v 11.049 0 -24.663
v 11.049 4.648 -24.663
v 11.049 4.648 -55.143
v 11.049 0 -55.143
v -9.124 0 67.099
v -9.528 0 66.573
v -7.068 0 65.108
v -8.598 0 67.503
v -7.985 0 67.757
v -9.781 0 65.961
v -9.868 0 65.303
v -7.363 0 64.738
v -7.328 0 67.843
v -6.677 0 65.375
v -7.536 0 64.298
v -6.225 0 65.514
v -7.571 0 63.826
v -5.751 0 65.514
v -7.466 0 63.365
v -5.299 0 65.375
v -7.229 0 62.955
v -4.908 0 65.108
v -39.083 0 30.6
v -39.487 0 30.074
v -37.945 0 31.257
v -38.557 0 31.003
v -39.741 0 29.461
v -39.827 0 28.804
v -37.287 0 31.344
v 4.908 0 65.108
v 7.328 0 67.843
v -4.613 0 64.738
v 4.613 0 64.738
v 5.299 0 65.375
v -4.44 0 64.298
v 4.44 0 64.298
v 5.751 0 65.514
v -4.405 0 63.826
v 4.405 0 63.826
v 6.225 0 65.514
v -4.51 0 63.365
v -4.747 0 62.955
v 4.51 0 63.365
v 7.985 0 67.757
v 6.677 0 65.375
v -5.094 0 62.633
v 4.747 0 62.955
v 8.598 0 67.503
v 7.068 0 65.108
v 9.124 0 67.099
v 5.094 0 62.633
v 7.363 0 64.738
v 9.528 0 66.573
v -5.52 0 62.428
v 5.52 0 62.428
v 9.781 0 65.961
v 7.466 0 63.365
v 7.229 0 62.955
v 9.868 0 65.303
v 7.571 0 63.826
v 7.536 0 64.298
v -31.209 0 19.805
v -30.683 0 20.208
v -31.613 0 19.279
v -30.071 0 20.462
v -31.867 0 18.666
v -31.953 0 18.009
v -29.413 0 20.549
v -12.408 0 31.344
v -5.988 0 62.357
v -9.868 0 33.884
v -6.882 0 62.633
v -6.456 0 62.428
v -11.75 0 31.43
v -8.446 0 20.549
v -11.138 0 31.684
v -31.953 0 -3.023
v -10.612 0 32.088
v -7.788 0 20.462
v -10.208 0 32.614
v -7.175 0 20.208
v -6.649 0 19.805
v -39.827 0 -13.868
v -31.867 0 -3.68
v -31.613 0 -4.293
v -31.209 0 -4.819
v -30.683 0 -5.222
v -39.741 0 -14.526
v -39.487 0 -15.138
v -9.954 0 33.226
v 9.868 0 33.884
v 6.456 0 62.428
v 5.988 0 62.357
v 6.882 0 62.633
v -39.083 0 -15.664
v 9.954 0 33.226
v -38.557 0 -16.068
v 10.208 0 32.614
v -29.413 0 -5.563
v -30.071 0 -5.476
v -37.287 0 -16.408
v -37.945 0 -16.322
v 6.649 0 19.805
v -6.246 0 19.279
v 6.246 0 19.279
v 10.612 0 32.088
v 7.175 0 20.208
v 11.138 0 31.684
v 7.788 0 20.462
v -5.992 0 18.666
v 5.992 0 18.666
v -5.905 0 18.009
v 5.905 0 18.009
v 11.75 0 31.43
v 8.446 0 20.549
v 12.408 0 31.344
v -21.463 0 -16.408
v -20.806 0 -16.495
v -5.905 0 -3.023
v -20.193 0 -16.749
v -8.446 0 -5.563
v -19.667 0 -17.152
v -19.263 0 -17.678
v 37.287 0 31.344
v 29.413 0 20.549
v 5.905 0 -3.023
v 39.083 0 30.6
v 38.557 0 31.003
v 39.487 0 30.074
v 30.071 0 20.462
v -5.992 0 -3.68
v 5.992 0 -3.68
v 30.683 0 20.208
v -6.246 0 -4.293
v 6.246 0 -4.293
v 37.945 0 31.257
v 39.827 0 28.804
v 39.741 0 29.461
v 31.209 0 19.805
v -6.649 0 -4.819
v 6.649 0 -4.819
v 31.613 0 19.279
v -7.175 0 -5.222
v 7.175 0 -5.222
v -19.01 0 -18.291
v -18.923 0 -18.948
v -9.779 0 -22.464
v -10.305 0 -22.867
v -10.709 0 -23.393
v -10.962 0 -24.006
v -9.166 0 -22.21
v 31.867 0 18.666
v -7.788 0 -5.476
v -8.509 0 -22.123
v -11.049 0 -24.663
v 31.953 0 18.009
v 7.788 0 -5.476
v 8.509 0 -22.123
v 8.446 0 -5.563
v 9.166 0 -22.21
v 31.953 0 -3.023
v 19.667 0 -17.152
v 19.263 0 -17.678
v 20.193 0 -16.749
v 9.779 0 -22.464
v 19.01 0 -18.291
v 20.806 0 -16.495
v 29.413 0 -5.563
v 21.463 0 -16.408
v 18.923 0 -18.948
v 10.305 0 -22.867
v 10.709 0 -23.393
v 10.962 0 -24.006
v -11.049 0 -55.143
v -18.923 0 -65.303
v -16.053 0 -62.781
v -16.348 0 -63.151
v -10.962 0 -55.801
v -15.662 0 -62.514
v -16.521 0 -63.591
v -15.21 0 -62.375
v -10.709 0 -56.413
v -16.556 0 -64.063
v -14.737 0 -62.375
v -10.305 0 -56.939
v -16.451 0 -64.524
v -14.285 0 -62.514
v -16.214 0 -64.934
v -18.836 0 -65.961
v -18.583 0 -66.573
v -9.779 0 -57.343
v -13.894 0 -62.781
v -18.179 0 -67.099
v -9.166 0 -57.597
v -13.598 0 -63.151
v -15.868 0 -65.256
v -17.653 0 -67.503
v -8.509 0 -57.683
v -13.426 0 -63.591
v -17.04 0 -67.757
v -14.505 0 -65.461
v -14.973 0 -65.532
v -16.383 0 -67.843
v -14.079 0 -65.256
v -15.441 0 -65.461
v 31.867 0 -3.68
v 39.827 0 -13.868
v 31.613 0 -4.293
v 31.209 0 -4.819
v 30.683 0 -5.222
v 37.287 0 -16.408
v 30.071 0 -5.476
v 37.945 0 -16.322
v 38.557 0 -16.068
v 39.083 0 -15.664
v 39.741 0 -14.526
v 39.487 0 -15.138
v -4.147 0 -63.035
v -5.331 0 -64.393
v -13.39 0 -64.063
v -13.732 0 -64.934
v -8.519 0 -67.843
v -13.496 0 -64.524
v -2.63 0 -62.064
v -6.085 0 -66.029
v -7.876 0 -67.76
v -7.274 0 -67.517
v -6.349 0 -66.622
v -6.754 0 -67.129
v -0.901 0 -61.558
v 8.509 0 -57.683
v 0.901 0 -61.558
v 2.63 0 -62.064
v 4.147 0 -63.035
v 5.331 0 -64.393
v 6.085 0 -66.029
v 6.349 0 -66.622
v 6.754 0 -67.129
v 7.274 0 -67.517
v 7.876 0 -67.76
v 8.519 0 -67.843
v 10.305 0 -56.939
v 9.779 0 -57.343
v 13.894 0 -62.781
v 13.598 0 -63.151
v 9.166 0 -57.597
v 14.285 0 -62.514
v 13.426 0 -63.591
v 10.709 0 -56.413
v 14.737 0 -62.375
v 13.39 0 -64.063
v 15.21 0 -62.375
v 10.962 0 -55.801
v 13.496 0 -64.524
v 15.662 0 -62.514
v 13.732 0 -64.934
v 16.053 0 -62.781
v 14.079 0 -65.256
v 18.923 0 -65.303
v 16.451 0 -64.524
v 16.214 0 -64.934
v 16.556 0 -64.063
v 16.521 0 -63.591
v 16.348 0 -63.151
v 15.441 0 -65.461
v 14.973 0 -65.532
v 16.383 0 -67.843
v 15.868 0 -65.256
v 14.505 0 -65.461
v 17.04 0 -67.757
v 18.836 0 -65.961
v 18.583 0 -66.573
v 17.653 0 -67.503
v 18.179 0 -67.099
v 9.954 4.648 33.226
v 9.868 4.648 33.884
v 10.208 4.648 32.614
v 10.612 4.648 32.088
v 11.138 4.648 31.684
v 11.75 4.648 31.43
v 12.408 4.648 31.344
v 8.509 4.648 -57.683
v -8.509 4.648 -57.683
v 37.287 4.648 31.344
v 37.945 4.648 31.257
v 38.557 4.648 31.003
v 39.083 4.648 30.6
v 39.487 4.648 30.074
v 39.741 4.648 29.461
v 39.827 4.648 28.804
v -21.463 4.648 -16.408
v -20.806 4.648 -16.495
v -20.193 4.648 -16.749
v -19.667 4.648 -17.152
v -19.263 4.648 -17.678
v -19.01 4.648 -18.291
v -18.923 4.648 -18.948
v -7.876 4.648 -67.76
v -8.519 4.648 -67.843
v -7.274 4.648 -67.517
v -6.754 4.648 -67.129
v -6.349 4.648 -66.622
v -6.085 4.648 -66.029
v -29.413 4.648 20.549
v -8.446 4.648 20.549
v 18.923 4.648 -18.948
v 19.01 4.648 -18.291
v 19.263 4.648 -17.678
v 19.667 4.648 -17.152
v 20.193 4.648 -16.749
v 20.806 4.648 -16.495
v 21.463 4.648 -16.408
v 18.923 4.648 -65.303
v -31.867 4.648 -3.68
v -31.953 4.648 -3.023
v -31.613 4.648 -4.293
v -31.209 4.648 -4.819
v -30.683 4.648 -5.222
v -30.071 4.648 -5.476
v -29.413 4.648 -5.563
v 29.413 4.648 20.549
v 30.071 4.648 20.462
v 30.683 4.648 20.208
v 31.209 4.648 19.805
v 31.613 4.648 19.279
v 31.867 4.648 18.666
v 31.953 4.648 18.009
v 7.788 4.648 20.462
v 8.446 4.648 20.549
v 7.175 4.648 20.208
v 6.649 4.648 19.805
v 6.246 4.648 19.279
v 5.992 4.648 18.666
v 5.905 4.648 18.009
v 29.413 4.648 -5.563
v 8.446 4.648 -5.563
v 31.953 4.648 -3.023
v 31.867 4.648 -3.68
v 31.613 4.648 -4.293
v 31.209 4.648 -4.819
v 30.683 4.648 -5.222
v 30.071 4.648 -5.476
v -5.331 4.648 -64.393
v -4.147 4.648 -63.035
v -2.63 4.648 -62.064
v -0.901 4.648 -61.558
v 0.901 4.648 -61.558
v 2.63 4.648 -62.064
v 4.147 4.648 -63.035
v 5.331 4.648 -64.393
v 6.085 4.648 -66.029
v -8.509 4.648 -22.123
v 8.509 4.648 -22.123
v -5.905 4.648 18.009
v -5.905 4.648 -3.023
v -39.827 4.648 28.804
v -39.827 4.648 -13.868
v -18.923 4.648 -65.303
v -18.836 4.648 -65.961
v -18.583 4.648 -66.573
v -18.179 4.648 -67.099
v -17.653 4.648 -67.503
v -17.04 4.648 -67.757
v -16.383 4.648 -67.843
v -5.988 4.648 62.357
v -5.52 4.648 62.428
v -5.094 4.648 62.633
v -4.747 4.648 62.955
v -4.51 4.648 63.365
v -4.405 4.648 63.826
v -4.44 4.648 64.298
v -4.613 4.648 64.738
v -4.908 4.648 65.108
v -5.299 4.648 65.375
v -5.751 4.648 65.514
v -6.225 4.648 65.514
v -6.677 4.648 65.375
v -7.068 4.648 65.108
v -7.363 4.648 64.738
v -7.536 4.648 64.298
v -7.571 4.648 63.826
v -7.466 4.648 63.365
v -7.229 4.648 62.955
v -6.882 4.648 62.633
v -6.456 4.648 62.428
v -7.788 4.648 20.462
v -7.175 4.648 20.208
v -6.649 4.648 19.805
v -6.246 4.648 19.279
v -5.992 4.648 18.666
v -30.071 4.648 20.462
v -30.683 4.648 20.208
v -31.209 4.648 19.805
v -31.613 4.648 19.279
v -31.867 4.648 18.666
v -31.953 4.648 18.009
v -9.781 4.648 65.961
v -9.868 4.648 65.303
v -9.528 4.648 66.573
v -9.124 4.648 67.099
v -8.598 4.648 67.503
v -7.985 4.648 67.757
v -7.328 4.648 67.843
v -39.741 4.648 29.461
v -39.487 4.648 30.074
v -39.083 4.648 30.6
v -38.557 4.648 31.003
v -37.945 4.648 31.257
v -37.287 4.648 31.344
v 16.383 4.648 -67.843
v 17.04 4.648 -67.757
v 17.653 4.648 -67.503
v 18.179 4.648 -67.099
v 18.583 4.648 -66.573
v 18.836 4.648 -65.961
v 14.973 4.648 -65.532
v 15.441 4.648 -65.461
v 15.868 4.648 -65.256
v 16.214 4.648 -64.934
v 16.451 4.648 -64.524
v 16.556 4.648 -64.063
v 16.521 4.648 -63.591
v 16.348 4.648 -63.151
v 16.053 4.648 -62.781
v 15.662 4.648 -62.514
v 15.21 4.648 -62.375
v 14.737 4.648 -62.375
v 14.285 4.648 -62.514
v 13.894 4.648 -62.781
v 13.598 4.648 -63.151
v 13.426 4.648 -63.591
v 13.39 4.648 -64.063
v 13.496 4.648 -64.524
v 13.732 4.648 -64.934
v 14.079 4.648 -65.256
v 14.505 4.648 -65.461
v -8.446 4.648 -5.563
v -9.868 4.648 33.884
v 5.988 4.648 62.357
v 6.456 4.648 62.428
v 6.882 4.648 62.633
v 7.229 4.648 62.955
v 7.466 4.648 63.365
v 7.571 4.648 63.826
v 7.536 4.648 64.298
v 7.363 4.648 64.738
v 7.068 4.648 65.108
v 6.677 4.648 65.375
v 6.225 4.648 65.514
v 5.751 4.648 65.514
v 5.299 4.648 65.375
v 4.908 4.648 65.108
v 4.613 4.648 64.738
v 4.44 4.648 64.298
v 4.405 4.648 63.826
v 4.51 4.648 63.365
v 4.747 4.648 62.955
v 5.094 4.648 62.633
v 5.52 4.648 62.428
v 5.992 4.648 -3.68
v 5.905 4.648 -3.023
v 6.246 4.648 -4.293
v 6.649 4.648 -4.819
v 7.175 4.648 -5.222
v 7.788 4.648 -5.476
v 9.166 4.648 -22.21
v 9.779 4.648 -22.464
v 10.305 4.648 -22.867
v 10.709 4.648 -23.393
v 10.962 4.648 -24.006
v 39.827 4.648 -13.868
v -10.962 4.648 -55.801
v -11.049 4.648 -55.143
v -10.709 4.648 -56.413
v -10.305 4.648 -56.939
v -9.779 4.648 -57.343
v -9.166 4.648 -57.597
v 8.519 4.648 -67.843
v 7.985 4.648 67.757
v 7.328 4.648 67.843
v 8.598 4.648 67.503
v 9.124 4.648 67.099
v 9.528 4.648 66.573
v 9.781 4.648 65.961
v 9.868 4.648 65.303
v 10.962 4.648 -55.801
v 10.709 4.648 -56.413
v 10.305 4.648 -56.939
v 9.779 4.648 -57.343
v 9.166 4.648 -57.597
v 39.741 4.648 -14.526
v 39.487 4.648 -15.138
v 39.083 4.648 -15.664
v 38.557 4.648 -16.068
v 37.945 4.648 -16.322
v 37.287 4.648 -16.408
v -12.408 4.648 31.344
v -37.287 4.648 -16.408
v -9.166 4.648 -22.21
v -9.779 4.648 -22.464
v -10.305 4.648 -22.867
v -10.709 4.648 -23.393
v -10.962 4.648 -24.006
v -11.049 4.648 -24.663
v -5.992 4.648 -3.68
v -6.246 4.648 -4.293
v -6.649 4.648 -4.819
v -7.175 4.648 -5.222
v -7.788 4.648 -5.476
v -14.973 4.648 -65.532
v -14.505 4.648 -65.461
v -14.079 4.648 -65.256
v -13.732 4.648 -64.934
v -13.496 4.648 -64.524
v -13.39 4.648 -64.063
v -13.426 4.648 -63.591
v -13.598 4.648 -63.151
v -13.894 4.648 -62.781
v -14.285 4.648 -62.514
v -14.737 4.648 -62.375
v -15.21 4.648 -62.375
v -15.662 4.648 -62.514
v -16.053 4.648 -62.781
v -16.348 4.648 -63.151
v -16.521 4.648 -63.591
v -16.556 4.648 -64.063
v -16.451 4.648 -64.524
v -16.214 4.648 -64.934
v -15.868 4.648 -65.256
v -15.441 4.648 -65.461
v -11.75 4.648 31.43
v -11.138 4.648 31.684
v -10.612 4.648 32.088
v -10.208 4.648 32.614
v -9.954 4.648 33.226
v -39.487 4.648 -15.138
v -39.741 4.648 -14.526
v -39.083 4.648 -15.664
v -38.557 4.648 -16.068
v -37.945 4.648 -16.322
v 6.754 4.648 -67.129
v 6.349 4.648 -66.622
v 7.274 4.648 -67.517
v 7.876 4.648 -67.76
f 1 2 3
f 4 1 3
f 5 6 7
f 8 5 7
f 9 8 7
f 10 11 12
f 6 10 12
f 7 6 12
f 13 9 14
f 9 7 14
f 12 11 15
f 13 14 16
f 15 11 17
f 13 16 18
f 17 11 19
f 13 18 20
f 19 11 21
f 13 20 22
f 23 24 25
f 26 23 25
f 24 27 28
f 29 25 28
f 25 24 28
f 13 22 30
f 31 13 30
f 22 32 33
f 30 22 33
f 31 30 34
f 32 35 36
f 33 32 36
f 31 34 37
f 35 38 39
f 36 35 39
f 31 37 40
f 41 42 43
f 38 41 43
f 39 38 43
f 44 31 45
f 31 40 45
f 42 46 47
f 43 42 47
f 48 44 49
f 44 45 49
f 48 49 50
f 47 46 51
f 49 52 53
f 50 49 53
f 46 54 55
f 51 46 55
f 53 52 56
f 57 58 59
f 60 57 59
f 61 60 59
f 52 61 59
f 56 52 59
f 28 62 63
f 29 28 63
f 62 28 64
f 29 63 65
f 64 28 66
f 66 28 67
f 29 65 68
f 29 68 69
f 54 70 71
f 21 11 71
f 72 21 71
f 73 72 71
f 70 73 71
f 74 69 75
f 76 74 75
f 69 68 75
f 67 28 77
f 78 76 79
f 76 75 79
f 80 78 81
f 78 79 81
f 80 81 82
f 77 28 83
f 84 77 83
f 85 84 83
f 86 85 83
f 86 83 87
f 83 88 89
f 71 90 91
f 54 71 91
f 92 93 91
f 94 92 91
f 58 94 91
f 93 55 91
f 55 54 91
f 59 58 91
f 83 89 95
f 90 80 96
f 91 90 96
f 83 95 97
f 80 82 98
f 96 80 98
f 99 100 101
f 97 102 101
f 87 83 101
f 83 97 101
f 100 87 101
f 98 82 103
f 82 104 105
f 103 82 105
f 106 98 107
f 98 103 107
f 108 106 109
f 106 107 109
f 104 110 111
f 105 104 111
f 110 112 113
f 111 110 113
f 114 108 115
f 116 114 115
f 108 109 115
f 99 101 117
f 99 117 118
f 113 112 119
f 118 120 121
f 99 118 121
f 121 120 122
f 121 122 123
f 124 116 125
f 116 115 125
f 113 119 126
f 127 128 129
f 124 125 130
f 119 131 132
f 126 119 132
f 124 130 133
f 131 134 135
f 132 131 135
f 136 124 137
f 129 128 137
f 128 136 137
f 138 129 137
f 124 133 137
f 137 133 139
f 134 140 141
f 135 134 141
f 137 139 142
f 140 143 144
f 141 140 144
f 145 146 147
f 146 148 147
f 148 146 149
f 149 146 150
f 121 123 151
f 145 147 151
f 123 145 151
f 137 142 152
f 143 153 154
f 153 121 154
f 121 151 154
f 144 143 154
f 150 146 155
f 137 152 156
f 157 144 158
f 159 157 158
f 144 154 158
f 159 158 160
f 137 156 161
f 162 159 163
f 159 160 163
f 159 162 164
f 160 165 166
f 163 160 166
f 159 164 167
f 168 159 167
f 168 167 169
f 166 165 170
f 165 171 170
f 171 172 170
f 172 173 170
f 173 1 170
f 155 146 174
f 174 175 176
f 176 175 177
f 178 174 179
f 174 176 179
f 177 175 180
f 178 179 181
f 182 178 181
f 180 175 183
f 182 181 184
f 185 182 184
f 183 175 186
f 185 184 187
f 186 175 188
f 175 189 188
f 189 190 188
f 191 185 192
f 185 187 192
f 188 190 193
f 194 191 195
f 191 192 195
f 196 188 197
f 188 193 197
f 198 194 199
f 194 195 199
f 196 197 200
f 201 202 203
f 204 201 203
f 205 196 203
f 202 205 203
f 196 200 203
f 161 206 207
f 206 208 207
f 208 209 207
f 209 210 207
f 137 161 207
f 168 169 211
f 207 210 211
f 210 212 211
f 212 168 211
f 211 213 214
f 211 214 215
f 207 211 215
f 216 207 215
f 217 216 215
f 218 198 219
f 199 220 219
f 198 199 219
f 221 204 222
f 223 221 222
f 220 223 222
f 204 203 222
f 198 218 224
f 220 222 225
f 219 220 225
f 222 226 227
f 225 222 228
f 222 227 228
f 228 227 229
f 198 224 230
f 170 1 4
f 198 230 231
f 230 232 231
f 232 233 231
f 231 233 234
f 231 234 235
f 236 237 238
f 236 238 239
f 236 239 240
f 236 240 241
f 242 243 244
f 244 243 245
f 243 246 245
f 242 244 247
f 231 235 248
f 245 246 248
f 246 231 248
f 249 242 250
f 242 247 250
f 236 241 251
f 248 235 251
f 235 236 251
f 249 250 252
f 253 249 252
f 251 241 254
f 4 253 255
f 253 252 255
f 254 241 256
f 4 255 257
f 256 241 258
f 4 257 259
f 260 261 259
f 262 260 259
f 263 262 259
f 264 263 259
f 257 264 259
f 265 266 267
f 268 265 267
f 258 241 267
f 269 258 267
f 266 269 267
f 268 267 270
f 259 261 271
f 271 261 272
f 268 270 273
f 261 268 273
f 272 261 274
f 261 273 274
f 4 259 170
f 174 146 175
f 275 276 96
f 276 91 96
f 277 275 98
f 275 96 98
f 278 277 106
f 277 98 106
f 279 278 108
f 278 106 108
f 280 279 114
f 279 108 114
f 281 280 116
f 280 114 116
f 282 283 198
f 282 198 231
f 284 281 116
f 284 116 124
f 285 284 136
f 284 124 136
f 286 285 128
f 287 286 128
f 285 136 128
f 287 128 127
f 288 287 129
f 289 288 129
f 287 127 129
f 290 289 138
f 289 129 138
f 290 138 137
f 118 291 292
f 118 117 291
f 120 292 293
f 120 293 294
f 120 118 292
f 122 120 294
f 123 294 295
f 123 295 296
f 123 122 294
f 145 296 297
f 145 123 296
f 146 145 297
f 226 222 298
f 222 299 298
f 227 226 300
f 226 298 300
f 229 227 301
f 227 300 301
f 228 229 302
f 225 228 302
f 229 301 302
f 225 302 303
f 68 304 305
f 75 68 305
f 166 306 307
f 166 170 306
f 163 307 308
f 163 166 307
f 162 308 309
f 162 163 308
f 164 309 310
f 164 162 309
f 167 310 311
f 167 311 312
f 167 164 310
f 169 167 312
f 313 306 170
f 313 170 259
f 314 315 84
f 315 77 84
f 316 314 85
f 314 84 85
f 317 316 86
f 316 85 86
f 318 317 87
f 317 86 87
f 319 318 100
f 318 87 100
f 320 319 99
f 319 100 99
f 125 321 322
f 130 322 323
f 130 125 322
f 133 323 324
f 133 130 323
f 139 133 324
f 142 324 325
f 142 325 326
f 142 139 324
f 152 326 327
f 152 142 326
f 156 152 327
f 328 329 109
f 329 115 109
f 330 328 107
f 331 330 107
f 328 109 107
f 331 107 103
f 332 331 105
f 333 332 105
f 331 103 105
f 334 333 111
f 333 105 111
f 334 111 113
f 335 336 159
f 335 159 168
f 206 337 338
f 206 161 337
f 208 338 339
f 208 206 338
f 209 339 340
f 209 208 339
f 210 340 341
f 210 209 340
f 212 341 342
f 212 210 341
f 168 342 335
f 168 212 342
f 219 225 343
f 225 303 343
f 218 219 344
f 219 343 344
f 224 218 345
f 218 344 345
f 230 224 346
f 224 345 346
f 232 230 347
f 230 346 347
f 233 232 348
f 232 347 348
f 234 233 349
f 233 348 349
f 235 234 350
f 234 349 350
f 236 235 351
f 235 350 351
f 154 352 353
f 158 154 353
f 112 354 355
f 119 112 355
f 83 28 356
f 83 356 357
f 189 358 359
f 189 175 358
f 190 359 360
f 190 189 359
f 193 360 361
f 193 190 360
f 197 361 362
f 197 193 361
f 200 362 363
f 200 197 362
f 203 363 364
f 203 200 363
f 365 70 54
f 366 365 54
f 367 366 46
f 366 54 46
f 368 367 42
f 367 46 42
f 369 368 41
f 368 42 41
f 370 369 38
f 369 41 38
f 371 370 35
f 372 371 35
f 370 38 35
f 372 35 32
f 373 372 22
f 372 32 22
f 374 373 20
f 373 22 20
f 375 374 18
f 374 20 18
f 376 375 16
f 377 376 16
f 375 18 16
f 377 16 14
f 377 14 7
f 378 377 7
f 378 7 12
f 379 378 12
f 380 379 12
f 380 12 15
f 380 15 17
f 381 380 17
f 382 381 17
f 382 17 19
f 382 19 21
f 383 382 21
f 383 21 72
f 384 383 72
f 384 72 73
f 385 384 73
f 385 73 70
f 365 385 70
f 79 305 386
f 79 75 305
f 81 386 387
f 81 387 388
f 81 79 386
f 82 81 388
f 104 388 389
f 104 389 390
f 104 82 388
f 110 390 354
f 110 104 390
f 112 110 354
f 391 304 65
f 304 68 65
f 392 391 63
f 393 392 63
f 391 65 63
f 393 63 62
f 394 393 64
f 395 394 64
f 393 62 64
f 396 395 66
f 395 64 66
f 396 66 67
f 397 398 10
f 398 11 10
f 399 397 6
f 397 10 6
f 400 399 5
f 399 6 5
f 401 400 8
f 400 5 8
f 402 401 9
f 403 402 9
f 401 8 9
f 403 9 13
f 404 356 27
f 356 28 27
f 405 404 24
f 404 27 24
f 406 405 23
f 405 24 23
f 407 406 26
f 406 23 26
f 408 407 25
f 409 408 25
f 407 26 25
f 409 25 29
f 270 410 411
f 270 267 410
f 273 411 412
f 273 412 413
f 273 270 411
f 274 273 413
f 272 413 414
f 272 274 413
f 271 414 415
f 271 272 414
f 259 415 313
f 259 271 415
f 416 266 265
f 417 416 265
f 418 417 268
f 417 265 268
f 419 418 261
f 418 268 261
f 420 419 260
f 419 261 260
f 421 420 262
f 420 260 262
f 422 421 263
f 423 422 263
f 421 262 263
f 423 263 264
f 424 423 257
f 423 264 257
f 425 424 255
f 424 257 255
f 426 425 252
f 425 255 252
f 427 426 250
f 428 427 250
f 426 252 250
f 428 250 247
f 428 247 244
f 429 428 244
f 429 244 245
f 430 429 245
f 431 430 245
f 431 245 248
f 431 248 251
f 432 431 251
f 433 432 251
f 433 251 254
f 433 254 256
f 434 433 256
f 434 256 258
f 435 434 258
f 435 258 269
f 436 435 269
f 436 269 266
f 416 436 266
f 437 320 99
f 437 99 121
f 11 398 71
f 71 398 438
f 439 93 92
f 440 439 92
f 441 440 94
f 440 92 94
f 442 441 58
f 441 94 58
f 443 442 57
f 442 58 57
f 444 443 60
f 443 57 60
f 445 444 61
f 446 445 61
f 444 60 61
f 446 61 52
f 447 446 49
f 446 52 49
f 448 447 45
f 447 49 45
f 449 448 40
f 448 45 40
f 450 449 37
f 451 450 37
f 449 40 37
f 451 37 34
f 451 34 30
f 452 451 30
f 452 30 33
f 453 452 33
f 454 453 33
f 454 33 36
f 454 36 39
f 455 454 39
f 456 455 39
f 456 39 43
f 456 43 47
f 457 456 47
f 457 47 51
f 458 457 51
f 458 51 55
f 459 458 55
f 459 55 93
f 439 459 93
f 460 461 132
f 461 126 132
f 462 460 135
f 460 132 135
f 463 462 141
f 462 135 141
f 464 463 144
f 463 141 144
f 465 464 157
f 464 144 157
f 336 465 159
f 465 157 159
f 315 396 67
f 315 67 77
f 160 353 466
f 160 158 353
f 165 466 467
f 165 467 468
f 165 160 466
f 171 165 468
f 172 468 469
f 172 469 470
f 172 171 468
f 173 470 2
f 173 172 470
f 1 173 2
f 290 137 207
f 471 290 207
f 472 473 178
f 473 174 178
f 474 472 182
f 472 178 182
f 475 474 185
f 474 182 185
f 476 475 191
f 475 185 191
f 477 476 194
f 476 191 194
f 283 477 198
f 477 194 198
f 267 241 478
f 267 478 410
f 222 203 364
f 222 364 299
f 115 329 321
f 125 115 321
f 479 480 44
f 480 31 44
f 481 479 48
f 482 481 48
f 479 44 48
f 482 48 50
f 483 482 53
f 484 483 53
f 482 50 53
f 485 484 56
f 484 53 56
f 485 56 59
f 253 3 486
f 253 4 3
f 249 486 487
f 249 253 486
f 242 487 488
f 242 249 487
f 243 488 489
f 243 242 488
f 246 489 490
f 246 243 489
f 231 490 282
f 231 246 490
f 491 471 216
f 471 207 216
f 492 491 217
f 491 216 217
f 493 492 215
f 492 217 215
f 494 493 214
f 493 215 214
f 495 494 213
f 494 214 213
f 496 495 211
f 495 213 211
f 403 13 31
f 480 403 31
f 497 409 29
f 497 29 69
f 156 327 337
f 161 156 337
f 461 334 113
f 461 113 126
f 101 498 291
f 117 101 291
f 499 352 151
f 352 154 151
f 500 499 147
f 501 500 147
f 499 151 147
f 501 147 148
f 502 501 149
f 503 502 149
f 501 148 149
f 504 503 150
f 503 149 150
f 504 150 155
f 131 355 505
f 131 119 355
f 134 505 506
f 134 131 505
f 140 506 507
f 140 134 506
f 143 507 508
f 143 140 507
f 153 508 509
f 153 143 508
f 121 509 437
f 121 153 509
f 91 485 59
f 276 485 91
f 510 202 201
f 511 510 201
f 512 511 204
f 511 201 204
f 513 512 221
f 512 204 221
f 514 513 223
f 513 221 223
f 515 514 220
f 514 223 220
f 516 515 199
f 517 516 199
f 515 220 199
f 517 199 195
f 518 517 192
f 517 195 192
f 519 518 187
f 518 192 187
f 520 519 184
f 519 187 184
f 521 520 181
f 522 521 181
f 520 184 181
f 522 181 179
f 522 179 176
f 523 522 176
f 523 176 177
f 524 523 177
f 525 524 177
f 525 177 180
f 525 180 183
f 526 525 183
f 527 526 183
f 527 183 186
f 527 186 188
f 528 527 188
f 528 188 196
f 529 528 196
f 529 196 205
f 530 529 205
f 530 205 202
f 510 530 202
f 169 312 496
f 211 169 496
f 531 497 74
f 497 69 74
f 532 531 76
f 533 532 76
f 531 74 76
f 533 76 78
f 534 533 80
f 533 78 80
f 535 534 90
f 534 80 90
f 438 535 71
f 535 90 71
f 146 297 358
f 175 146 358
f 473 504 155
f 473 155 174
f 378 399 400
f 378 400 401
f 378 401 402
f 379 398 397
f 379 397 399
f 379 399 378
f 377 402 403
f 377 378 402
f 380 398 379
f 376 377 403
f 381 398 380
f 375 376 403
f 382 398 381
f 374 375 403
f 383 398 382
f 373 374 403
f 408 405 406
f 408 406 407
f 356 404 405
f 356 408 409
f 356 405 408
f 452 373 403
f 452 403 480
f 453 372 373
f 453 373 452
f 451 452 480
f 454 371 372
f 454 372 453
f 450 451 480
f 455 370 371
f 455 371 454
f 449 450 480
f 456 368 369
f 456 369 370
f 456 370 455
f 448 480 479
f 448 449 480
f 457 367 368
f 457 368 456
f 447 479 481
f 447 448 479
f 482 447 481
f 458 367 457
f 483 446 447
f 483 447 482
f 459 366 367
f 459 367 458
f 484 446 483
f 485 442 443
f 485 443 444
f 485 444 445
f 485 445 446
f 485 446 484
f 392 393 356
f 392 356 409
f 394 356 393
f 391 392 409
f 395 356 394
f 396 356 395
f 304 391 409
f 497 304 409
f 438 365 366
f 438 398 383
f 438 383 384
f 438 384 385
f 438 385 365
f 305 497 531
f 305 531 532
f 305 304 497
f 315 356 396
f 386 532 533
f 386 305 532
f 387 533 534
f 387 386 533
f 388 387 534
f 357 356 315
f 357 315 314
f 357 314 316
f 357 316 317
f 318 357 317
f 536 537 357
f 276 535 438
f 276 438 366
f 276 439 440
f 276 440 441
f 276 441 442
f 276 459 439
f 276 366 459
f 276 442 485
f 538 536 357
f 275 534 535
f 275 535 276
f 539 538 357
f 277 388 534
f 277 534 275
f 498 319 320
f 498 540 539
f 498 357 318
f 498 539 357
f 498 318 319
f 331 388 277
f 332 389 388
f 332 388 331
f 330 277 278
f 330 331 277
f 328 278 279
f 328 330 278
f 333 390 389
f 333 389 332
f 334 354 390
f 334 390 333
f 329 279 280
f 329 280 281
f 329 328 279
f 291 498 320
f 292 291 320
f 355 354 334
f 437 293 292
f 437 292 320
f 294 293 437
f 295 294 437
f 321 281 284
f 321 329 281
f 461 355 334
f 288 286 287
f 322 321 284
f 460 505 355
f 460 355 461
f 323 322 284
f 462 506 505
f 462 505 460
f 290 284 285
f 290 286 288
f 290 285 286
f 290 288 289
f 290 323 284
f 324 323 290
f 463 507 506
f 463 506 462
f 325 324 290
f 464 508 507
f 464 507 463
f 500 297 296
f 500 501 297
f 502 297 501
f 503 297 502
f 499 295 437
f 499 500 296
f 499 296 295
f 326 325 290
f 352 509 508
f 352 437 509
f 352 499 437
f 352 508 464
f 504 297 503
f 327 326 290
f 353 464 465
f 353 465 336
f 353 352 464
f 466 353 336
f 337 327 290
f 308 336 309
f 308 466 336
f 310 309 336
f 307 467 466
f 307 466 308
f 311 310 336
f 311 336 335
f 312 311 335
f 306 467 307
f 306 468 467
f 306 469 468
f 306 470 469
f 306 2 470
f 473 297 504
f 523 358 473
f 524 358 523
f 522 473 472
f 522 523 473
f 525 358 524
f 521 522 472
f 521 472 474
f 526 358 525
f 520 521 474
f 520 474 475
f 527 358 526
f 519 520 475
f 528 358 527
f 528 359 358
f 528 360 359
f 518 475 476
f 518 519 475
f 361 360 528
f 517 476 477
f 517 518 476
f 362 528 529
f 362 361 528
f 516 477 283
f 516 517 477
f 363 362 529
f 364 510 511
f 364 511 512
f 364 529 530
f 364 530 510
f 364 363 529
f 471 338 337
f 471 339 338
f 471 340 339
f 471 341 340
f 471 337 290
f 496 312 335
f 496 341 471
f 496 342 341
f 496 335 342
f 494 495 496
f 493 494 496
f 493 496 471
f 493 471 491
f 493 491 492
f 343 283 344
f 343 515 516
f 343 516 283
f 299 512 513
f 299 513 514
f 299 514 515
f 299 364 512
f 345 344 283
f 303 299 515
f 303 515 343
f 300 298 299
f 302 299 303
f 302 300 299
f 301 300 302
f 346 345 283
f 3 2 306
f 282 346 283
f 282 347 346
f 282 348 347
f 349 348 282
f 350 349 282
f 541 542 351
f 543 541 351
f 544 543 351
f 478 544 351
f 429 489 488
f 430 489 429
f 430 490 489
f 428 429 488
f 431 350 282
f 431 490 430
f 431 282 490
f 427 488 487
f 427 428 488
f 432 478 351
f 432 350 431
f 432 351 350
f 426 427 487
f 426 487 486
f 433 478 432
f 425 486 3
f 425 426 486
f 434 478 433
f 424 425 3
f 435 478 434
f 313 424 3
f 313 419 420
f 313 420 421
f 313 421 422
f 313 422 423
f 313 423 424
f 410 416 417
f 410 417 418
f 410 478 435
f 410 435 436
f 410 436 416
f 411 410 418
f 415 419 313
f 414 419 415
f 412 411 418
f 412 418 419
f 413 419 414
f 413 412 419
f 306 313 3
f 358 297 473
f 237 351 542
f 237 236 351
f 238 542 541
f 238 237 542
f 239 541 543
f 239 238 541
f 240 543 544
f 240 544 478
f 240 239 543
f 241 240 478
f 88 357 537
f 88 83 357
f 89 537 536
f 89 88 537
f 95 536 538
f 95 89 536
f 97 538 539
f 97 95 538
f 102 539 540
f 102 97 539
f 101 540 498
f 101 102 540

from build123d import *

# Parameters (mm, degrees)
SKETCH1_W                    = 79.6544
SKETCH1_H                    = 135.6868
BOSS_EXTRUDE1_DEPTH          = 4.6482
SKETCH2_W                    = 20.9042
SKETCH2_H                    = 51.435
SKETCH2_W_2                  = 22.098
SKETCH2_H_2                  = 35.56
SKETCH2_W_3                  = 26.0477
SKETCH2_H_3                  = 26.1112
SKETCH2_W_4                  = 29.9593
SKETCH2_H_4                  = 36.4998
CUT_EXTRUDE1_DEPTH           = 79.806970165
F_1_8_0_125_DIAMETER_HOLE1_D = 3.175
FILLET1_R                    = 2.54


with BuildPart() as part:
    # Sketch1 → Boss-Extrude1 (new body)
    with BuildSketch(Plane(origin=(0, 0, 0), x_dir=(1, 0, 0), z_dir=(0, 1, 0))):
        Rectangle(SKETCH1_W, SKETCH1_H)
    extrude(amount=BOSS_EXTRUDE1_DEPTH)

    # Sketch2 → Cut-Extrude1 (cut, through all)
    with BuildSketch(Plane(origin=(0, 4.6482, 0), x_dir=(1, 0, 0), z_dir=(0, 1, 0))):
        with Locations((29.3751, 42.1259)):
            Rectangle(SKETCH2_W, SKETCH2_H)
        with Locations((0, 39.9034)):
            Rectangle(SKETCH2_W_2, SKETCH2_H_2)
        with Locations((18.92935, -7.493)):
            Rectangle(SKETCH2_W_3, SKETCH2_H_3)
        with Locations((-18.92935, -7.493)):
            Rectangle(SKETCH2_W_3, SKETCH2_H_3)
        with Locations((-24.84755, -49.5935)):
            Rectangle(SKETCH2_W_4, SKETCH2_H_4)
        with Locations((24.84755, -49.5935)):
            Rectangle(SKETCH2_W_4, SKETCH2_H_4)
        with BuildLine():
            Line((6.35, 67.8434), (-6.35, 67.8434))
            ThreePointArc((-6.35, 67.8434), (0, 61.4934), (6.35, 67.8434))
        make_face()
        with BuildLine():
            ThreePointArc((6.35, 67.8434), (0, 74.1934), (-6.35, 67.8434))
            Line((-6.35, 67.8434), (6.35, 67.8434))
        make_face()
        with Locations((-29.3751, 42.1259)):
            Rectangle(SKETCH2_W, SKETCH2_H)
    extrude(amount=-CUT_EXTRUDE1_DEPTH, mode=Mode.SUBTRACT)

    # 1/8 (0.125) Diameter Hole1 (through all)
    with Locations(Plane(origin=(-14.9733, 4.6482, -63.9445), x_dir=(0, 0, 1), z_dir=(0, 1, 0))):
        with Locations((0, 0), (0, 29.9466), (127.889, 20.96135), (127.889, 8.98525)):
            Hole(F_1_8_0_125_DIAMETER_HOLE1_D / 2)

    # Fillet1
    fillet1_edges = [part.edges().sort_by_distance(p)[0] for p in [
        (-9.8679, 2.3241, 67.8434),
        (-39.8272, 2.3241, 31.3436),
        (-9.8679, 2.3241, 31.3436),
        (-5.9055, 2.3241, -5.5626),
        (-5.9055, 2.3241, 20.5486),
        (-31.9532, 2.3241, 20.5486),
        (-31.9532, 2.3241, -5.5626),
        (31.9532, 2.3241, -5.5626),
        (31.9532, 2.3241, 20.5486),
        (5.9055, 2.3241, 20.5486),
        (5.9055, 2.3241, -5.5626),
        (11.049, 2.3241, -22.1234),
        (-11.049, 2.3241, -22.1234),
        (-11.049, 2.3241, -57.6834),
        (11.049, 2.3241, -57.6834),
        (9.8679, 2.3241, 67.8434),
        (9.8679, 2.3241, 31.3436),
        (39.8272, 2.3241, 31.3436),
        (-6.35, 2.3241, -67.8434),
        (6.35, 2.3241, -67.8434),
        (-18.923, 2.3241, -67.8434),
        (-18.923, 2.3241, -16.4084),
        (-39.8272, 2.3241, -16.4084),
        (18.923, 2.3241, -67.8434),
        (39.8272, 2.3241, -16.4084),
        (18.923, 2.3241, -16.4084),
    ]]
    fillet(fillet1_edges, radius=FILLET1_R)


solid = part.part
